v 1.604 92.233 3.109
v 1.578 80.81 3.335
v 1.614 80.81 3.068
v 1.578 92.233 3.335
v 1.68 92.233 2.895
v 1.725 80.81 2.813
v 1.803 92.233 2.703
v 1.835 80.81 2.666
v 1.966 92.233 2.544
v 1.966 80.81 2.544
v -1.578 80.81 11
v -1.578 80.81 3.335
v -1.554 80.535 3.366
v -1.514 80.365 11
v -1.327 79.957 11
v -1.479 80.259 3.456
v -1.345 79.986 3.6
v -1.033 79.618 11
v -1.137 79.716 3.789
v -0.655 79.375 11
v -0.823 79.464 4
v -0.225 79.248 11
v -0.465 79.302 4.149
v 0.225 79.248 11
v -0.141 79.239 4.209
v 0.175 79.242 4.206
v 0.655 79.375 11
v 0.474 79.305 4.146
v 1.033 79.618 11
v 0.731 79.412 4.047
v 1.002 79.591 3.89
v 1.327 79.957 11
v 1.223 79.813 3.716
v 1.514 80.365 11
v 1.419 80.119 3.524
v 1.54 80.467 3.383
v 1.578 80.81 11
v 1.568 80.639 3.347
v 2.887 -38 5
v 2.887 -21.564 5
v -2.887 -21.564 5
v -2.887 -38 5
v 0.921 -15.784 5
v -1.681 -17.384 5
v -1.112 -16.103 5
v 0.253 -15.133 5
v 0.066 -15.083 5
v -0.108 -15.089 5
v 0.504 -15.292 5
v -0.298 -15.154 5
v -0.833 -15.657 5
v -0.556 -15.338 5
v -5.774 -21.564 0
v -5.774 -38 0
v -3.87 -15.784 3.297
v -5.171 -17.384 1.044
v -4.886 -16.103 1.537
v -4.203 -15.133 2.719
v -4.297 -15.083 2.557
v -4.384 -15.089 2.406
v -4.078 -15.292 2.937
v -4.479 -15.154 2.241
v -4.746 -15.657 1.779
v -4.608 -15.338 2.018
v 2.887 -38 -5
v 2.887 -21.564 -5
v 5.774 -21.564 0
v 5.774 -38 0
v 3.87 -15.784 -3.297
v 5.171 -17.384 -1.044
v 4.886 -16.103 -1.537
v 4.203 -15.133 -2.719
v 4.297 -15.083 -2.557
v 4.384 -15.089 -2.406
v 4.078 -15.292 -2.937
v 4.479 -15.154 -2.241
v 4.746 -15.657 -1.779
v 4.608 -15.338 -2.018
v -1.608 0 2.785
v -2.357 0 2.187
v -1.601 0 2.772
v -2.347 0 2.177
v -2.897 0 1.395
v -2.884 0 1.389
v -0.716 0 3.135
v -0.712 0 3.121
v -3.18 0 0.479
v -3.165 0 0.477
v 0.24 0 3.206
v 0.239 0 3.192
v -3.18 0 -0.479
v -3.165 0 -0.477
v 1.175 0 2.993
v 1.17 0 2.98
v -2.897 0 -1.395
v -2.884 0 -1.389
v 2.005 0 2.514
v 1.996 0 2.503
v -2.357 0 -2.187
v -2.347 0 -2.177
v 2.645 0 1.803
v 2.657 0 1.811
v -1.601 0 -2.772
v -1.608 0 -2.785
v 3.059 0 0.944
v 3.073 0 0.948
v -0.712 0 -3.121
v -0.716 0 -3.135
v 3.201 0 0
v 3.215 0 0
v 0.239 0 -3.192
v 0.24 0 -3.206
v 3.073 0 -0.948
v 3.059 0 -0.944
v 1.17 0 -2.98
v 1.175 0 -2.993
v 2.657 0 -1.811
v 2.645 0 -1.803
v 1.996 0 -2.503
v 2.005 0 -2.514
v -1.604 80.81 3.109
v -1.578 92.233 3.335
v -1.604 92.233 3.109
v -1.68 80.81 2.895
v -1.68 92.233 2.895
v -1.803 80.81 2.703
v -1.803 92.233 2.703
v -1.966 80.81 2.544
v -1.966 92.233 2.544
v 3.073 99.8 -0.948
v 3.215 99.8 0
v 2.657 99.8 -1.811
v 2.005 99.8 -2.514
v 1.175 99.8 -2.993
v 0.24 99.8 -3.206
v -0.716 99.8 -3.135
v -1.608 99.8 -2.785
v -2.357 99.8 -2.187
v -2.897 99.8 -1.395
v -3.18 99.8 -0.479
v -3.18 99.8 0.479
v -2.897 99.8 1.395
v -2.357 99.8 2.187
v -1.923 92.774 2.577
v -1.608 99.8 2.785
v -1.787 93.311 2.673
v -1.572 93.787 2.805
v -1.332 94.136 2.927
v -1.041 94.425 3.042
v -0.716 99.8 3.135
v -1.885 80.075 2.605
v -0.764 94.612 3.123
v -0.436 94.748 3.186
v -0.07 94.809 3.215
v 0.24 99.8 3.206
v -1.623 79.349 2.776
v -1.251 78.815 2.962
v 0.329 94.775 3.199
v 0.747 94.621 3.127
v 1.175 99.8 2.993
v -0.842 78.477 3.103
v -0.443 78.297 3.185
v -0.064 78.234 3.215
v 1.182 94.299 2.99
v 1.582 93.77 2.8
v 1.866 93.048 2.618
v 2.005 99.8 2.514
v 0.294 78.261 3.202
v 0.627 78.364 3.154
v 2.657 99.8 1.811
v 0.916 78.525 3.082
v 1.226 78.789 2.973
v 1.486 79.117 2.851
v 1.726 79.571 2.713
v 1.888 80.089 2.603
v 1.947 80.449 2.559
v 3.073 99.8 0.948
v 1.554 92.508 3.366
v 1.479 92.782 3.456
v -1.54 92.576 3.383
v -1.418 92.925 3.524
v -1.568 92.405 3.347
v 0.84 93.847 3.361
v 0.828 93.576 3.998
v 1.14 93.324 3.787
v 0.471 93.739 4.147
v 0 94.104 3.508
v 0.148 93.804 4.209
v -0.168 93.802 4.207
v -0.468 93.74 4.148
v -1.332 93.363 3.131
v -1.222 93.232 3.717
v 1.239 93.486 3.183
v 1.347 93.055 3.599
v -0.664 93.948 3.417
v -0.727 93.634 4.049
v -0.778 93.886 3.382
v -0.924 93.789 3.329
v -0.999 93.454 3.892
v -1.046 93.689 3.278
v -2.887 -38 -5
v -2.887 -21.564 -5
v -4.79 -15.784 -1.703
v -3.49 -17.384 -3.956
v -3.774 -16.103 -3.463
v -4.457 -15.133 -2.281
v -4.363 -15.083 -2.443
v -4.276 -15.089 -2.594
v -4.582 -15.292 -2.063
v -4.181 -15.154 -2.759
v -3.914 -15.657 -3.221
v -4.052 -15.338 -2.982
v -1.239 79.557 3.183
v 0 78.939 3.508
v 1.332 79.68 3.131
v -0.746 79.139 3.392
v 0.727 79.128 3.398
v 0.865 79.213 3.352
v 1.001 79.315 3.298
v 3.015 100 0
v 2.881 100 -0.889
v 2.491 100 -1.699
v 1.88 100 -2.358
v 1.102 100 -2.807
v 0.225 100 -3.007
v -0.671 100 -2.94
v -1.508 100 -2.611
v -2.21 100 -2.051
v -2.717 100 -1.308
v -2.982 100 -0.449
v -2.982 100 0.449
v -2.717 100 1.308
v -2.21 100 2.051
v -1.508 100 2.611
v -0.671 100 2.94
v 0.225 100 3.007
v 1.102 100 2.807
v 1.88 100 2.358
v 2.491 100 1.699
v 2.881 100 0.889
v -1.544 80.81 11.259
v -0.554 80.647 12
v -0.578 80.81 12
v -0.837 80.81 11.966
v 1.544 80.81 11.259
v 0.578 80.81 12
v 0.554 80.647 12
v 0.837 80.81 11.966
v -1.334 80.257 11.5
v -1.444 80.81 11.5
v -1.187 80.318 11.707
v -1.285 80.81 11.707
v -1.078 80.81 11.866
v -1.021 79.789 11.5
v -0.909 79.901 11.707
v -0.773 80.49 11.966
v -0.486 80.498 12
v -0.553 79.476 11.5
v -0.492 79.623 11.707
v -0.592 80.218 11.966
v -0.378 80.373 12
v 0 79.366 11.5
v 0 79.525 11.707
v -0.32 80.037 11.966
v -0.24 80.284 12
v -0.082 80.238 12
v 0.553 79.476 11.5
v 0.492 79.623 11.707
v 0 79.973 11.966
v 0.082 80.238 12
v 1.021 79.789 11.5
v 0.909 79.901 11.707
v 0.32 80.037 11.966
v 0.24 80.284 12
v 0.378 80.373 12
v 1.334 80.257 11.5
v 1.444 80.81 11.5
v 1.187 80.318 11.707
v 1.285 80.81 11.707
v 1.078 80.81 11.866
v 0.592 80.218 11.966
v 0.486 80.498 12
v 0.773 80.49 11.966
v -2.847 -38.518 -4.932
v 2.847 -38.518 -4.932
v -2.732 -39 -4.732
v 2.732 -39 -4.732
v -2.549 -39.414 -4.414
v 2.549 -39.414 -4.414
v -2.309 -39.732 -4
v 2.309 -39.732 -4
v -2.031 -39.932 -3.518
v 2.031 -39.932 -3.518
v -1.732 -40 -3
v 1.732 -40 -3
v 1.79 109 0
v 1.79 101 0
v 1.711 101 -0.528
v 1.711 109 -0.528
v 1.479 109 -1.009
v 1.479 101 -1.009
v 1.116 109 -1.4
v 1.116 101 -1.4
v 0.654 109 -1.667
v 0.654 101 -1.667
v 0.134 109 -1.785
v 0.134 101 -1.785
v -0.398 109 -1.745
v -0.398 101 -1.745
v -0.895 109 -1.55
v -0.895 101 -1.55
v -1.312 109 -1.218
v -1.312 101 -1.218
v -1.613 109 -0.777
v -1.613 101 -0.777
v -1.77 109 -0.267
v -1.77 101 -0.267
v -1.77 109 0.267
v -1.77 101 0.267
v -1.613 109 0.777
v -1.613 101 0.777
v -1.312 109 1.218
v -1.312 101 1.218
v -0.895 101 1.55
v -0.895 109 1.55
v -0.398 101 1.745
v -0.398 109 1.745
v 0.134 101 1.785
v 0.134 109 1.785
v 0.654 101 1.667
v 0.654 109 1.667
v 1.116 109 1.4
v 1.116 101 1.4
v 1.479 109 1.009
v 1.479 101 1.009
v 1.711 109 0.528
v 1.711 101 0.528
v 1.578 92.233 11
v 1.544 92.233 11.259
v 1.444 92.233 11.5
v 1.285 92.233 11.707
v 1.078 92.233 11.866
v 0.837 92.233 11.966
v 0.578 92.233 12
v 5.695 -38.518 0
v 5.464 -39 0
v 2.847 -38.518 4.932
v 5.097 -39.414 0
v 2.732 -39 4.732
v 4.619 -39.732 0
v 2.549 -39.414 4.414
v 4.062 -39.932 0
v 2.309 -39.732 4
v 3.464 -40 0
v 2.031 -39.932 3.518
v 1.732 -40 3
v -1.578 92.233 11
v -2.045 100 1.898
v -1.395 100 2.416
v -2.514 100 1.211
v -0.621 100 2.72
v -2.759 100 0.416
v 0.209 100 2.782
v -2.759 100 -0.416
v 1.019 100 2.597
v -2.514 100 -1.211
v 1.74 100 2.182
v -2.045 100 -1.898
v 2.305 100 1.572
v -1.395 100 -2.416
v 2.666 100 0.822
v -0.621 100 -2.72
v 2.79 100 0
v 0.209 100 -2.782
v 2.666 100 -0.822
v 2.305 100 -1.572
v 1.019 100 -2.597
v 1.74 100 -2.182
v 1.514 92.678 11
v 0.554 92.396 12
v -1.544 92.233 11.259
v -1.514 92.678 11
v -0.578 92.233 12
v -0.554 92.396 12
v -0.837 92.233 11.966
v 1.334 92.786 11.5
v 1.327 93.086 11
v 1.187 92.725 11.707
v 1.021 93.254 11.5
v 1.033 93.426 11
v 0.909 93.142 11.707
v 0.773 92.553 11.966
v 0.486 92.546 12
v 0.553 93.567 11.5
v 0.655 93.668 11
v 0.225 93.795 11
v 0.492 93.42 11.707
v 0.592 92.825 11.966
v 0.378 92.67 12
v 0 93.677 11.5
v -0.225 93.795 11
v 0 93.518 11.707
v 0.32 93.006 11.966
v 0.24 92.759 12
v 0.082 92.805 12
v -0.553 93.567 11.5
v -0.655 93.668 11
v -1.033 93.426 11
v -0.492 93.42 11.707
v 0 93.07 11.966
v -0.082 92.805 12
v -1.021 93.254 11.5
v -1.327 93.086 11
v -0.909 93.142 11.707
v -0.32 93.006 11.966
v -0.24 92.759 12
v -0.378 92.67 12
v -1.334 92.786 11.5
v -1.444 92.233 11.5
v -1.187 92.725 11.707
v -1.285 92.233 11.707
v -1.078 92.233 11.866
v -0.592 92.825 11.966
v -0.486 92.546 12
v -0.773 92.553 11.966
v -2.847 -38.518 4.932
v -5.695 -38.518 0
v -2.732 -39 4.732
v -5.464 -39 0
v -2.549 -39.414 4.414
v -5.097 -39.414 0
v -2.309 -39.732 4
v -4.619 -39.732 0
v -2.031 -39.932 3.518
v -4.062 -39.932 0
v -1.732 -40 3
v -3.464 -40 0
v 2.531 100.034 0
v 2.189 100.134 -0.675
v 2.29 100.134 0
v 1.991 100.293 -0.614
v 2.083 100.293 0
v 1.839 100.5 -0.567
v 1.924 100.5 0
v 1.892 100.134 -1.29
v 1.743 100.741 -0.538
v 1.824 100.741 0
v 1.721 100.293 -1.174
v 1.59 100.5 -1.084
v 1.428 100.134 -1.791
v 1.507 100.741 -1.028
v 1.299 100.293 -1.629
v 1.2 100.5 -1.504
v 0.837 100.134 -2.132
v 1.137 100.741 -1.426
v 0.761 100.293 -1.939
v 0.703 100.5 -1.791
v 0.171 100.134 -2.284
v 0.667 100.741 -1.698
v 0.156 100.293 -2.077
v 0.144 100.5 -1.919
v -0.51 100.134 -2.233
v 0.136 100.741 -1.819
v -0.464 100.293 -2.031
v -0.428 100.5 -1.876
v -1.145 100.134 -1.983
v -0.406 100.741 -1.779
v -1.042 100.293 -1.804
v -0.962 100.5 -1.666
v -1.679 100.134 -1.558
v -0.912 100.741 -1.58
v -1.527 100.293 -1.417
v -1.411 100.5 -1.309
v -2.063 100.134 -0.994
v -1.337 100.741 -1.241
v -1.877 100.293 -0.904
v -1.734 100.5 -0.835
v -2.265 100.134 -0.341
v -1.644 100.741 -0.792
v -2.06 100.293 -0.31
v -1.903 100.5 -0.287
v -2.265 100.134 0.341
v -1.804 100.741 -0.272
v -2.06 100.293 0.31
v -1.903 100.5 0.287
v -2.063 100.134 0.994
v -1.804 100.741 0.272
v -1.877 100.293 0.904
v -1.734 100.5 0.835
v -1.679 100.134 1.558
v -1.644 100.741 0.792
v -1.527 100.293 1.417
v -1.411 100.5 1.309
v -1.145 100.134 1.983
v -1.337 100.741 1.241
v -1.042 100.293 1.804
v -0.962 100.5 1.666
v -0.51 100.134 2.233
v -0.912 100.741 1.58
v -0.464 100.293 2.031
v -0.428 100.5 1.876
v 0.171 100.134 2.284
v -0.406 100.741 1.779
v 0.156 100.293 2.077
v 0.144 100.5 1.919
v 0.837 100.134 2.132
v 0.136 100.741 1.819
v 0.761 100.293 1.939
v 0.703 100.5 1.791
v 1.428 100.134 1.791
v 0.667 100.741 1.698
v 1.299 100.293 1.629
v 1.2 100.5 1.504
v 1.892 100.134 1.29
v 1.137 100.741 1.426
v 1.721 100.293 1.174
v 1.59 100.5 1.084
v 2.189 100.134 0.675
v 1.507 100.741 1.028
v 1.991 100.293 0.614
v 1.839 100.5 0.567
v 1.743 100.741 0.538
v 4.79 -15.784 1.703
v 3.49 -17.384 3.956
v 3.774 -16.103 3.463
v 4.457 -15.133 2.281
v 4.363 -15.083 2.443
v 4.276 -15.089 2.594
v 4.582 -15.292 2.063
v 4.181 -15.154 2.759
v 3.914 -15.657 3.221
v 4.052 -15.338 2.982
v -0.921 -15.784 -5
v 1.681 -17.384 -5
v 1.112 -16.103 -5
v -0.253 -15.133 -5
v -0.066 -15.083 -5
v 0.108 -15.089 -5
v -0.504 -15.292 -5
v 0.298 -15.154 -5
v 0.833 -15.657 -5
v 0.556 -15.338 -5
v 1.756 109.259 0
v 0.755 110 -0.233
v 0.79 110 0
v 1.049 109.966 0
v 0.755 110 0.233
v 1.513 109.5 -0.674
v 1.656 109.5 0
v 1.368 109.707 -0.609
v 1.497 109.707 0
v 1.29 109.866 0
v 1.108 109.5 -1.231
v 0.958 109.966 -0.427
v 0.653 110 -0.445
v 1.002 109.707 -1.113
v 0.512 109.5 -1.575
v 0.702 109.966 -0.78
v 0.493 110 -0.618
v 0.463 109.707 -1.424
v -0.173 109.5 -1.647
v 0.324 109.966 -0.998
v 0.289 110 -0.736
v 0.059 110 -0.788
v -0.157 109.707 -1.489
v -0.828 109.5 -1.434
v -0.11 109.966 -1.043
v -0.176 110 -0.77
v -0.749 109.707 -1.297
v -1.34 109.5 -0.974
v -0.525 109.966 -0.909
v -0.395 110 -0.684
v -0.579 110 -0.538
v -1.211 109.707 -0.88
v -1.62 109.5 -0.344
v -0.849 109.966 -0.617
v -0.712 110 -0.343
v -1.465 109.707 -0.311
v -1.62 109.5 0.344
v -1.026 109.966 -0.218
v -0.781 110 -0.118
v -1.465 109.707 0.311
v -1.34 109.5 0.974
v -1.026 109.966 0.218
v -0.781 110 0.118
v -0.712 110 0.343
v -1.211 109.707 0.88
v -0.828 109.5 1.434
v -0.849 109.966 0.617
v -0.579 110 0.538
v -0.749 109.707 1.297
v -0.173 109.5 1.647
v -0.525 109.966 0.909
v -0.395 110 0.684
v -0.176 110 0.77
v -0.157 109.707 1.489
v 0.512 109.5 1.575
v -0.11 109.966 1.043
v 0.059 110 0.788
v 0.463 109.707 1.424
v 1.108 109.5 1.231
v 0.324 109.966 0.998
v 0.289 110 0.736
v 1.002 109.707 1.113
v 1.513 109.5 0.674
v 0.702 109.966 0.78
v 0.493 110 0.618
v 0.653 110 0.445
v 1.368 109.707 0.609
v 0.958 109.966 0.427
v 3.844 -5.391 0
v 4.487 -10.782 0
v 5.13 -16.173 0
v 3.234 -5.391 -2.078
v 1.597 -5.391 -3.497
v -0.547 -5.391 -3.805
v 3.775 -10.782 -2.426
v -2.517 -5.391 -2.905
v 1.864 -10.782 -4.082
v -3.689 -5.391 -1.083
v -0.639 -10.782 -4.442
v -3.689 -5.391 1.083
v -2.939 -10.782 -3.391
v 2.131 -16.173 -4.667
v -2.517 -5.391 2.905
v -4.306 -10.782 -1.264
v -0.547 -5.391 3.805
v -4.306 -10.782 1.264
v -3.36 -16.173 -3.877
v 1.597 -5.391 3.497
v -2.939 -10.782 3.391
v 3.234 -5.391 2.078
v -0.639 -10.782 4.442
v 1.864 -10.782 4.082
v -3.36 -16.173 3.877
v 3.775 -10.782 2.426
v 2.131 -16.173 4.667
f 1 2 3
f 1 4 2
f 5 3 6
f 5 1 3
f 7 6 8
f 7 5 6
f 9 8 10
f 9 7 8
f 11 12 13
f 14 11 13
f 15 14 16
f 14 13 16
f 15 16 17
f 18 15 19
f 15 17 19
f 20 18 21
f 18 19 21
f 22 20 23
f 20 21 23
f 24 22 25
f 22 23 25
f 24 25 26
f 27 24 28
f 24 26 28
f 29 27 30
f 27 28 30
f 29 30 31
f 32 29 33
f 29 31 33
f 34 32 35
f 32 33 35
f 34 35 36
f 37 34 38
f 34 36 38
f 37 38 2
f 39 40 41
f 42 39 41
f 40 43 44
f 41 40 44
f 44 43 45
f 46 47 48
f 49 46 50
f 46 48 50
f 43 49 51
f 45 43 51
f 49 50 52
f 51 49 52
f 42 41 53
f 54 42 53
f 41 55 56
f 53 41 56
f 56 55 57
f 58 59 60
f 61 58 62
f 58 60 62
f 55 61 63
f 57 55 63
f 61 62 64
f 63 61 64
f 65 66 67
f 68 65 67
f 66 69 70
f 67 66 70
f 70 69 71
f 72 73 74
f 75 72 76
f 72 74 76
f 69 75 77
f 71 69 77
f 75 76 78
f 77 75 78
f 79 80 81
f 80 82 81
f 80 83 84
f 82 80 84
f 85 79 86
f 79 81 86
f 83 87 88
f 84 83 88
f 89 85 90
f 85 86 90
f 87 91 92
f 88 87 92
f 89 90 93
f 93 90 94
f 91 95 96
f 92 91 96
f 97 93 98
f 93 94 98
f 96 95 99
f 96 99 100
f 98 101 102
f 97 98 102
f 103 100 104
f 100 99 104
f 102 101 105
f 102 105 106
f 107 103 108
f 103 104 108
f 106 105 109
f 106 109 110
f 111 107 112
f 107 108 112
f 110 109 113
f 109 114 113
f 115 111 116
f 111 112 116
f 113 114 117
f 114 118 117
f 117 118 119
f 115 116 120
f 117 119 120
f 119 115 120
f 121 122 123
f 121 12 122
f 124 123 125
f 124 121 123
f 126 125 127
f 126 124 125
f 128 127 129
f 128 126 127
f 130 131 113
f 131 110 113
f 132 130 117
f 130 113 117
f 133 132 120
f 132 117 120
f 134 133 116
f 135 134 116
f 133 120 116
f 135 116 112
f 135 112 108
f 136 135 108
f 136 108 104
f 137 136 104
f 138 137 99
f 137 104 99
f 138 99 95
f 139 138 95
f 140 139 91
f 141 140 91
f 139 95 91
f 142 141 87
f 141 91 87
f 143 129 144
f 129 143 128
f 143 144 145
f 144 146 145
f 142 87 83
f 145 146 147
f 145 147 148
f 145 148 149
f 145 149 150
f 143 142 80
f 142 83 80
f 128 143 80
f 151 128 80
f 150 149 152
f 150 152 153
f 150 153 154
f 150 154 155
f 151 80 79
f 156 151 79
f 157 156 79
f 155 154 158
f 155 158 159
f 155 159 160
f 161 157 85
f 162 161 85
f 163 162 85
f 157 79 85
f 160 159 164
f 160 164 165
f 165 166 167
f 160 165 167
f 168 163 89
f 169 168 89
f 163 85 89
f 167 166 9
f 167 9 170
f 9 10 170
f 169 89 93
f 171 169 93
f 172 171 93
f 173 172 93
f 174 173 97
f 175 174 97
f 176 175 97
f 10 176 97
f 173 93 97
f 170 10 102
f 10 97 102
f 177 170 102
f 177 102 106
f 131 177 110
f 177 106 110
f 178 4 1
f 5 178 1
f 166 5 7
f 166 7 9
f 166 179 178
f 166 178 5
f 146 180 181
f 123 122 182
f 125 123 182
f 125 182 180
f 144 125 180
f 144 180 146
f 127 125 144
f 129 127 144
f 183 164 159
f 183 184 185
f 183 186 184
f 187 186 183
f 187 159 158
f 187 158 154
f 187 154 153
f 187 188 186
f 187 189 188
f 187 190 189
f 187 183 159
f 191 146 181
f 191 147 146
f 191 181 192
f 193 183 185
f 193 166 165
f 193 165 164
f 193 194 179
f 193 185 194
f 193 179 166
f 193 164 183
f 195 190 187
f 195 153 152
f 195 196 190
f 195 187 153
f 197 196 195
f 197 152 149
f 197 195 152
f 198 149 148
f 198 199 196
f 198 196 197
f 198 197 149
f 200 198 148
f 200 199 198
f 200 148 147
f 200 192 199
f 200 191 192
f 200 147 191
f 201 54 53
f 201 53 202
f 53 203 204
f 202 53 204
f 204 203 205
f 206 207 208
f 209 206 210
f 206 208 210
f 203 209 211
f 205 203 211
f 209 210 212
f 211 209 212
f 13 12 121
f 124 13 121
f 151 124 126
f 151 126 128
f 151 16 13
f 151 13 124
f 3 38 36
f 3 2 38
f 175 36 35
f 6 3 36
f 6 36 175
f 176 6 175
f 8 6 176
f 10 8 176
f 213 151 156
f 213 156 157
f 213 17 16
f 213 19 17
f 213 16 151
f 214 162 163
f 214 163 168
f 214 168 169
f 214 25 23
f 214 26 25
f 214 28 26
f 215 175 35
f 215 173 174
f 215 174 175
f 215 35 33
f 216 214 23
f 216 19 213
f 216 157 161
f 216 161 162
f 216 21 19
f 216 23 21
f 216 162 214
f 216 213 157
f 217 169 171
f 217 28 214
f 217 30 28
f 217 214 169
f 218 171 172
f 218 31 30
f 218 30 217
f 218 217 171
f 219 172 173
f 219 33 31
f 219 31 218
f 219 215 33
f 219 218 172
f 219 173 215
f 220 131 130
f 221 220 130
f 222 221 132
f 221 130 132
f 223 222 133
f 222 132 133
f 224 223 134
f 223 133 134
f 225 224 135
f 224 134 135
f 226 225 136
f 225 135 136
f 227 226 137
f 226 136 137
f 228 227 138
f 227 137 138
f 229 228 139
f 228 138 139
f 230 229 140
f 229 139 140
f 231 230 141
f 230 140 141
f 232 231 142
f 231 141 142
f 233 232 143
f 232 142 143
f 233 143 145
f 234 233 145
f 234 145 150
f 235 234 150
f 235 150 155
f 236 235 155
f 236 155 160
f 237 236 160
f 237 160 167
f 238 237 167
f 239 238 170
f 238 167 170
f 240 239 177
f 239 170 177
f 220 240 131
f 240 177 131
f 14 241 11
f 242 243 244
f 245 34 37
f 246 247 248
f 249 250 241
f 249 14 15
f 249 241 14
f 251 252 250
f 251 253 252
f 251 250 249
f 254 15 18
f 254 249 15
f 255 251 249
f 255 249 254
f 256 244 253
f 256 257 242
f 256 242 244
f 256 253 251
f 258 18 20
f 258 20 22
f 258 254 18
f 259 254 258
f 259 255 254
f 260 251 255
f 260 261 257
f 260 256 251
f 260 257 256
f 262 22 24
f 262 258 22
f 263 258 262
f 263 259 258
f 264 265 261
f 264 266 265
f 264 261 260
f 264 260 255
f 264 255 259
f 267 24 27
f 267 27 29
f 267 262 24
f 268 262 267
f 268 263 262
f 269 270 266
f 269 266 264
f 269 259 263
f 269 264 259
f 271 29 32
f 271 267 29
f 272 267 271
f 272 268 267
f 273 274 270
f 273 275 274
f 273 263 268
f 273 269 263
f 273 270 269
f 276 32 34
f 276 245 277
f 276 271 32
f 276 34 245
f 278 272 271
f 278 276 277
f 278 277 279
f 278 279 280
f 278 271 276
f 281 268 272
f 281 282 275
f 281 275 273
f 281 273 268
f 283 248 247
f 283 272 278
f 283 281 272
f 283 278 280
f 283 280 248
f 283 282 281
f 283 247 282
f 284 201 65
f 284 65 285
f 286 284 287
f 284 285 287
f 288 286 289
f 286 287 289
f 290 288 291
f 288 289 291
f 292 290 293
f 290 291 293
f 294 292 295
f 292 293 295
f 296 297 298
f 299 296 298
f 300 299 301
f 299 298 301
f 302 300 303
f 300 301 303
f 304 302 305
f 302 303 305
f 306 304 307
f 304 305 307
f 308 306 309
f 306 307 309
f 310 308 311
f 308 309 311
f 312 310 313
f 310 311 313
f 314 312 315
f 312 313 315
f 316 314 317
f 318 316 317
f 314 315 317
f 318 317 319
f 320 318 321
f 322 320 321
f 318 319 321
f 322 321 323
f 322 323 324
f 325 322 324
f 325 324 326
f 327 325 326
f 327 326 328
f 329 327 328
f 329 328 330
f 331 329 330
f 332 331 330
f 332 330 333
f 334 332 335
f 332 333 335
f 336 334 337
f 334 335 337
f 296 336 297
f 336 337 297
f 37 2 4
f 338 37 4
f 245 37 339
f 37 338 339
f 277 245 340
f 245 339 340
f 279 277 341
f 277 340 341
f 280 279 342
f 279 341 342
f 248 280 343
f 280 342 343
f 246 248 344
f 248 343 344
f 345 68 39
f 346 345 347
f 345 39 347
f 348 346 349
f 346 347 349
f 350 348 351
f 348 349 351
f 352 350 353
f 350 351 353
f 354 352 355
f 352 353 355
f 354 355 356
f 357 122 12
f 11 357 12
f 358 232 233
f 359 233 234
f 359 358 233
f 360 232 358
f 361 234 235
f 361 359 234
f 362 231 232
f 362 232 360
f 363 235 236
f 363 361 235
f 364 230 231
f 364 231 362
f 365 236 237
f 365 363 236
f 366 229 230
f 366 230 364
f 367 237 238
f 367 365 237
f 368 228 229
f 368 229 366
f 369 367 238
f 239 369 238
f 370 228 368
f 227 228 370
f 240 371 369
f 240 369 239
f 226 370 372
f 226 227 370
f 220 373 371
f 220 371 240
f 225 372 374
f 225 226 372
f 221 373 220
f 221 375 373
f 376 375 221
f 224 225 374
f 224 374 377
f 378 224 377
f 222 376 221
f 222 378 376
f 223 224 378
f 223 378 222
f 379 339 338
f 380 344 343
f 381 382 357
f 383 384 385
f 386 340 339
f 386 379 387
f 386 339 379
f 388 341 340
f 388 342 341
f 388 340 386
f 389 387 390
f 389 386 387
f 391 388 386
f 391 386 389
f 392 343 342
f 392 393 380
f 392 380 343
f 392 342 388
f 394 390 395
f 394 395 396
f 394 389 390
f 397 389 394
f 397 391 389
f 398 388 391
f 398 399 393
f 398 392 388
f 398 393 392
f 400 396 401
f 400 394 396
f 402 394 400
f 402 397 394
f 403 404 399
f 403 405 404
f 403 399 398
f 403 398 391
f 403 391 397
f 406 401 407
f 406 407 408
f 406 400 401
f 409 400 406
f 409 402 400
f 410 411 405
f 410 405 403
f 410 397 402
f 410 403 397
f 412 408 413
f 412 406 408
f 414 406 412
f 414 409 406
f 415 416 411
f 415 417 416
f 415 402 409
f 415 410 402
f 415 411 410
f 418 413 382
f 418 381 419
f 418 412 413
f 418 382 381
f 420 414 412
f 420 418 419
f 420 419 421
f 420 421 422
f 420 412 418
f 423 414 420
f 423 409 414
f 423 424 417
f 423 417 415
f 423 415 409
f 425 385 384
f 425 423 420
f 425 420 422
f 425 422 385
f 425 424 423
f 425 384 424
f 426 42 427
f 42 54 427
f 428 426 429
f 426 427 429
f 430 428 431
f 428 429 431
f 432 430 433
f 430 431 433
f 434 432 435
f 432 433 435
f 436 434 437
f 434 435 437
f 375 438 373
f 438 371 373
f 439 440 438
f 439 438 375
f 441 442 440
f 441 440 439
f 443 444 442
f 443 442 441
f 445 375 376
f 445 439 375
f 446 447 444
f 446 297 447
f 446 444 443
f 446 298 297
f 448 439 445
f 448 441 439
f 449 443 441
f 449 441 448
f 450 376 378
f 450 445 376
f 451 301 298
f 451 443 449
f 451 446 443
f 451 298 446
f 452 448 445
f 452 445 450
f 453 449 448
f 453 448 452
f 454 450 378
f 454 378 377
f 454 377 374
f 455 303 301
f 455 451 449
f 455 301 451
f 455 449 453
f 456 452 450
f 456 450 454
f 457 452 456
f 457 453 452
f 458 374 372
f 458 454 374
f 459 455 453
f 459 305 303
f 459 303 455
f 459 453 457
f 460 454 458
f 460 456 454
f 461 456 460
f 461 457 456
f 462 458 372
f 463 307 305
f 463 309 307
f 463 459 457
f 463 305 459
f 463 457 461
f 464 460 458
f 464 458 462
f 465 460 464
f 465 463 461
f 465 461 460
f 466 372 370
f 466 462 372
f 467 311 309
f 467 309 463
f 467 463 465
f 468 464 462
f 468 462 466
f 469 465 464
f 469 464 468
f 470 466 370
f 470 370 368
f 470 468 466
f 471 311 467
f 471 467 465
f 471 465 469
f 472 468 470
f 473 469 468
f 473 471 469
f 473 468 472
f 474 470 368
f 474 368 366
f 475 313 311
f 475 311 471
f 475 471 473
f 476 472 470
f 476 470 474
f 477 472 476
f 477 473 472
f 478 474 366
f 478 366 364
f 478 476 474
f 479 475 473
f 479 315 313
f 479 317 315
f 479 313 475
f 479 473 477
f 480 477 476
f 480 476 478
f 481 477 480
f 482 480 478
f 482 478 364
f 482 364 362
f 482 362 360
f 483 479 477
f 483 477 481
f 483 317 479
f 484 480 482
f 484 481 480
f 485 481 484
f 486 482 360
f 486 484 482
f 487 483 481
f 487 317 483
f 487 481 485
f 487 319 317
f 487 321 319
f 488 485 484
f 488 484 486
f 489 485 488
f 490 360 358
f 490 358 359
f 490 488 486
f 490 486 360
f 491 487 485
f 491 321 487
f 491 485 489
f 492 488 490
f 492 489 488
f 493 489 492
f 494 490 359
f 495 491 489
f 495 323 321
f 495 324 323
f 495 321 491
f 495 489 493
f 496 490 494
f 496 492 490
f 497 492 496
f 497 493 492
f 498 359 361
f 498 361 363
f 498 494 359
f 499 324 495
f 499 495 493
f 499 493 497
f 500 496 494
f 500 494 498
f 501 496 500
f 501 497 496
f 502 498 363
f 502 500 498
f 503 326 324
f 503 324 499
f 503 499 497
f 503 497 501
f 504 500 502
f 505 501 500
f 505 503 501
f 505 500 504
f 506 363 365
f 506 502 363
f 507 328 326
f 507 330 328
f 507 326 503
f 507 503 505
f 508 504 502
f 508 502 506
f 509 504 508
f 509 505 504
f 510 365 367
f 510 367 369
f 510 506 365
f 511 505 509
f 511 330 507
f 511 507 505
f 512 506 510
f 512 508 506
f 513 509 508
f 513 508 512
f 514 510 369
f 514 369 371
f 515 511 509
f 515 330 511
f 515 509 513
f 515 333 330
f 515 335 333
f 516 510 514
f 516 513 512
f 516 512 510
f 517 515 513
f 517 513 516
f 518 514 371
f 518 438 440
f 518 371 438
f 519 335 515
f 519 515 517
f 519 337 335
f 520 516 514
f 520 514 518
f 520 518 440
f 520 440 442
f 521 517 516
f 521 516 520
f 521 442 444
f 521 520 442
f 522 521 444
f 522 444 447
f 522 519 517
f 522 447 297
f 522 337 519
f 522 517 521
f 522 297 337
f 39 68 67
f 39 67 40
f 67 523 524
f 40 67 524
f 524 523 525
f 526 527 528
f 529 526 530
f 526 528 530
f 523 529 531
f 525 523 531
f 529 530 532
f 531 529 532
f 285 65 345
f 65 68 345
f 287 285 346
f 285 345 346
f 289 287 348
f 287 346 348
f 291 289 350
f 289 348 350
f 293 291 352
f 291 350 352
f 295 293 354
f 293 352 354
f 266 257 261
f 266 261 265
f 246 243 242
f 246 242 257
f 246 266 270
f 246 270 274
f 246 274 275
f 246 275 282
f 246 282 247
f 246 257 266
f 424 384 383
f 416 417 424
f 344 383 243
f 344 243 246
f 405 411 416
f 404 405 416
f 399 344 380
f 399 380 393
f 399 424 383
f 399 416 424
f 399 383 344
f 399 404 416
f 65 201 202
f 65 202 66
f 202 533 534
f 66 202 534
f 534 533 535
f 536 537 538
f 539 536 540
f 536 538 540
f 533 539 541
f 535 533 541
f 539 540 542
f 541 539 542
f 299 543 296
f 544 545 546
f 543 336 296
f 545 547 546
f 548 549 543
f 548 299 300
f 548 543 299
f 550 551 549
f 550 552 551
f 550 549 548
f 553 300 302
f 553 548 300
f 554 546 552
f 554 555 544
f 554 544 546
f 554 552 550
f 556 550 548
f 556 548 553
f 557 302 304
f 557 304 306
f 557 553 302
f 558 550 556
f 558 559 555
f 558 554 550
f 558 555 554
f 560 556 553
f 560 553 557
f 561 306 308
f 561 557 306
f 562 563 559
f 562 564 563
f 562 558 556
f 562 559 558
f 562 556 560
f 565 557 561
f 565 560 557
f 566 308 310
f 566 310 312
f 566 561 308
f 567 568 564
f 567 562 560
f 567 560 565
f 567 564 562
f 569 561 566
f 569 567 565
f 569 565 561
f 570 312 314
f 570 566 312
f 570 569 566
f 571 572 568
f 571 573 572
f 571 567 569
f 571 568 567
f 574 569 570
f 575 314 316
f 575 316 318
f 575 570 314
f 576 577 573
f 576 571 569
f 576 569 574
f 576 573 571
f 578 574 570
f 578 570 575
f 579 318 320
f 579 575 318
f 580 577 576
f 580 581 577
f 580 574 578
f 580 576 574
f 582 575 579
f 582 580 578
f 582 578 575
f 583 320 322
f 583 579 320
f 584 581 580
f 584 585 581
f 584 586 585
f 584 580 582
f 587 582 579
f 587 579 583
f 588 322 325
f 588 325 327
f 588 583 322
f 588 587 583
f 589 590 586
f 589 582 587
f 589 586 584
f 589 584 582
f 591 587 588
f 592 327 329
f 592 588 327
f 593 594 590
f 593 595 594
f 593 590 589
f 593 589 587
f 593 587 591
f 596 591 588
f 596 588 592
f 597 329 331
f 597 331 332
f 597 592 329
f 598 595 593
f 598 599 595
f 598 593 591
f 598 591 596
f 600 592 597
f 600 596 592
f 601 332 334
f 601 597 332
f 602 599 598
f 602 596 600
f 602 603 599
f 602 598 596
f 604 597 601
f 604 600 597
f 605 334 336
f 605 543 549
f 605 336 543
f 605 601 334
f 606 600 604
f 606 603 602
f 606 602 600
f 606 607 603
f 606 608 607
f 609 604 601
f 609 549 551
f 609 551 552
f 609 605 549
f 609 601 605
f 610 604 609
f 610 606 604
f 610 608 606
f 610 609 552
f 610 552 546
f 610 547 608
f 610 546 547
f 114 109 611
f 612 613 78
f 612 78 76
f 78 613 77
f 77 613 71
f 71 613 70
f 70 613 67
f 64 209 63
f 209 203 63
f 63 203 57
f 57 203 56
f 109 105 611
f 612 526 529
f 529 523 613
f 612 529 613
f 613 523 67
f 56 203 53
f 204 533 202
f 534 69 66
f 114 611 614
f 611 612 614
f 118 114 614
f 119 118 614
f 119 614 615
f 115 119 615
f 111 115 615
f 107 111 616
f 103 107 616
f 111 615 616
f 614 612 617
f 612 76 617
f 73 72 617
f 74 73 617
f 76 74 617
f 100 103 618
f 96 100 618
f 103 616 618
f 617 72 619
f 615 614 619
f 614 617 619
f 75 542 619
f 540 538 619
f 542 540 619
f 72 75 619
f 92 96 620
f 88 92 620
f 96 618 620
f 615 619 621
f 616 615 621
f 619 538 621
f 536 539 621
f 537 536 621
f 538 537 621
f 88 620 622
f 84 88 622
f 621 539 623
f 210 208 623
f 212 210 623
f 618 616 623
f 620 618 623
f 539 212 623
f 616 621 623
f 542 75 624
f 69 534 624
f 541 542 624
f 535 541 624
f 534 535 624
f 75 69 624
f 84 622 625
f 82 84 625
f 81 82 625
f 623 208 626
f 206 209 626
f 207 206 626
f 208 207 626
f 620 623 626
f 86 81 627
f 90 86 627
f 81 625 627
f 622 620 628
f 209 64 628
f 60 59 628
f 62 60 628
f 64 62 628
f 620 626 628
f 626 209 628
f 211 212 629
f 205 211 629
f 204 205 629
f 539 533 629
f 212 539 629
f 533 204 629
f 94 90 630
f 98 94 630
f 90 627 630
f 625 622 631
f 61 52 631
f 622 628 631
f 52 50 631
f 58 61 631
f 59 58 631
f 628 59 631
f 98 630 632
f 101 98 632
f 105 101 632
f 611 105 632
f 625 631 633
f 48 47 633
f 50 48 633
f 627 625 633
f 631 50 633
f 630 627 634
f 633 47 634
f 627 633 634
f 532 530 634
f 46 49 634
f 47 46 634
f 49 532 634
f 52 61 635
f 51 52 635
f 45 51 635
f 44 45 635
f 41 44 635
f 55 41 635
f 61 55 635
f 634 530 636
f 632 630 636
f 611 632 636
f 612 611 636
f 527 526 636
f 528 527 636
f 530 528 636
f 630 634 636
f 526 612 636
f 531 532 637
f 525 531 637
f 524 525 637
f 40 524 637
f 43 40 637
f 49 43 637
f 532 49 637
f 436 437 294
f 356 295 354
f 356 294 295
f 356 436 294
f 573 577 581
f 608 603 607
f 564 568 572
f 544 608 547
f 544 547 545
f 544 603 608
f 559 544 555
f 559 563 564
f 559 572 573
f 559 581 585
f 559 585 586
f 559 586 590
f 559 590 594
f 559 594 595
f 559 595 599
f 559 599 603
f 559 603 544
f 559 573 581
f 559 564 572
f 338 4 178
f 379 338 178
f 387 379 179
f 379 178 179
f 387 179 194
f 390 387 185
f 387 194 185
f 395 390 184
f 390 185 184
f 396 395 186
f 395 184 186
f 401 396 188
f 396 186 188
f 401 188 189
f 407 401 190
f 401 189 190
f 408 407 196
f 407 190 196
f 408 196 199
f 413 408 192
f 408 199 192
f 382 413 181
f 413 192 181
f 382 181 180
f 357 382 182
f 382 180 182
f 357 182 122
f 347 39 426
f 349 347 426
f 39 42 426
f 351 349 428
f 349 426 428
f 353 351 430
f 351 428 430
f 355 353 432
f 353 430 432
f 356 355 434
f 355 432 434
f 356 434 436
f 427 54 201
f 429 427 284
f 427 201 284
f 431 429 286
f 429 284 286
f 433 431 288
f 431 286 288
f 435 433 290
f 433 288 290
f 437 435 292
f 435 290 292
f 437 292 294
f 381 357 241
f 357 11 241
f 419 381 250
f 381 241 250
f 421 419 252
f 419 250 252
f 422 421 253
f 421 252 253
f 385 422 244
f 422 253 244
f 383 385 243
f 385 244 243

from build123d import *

# Parameters (mm, degrees)
PAD_DEPTH    = 40
SKETCH001_R  = 3.215442
PAD001_DEPTH = 100
SKETCH002_R  = 1.790301
PAD002_DEPTH = 10
FILLET_R     = 1
FILLET001_R  = 1
CHAMFER_SIZE = 0.2
FILLET002_R  = 2
PAD003_DEPTH = 10
FILLET003_R  = 1
FILLET004_R  = 1


with BuildPart() as part:
    # Sketch → Pad (new body)
    with BuildSketch(Plane.XZ):
        Polygon((2.886751, -5), (5.773503, 0), (2.886751, 5), (-2.886751, 5), (-5.773503, 0), (-2.886751, -5), align=None)
    extrude(amount=PAD_DEPTH)

    # Sketch001 (on Face7 of Pad) → Pad001 (join)
    with BuildSketch(Plane(origin=(0, 0, 0), x_dir=(1, 0, 0), z_dir=(0, 1, 0))):
        Circle(SKETCH001_R)
    extrude(amount=PAD001_DEPTH)

    # Sketch002 (on Face10 of Pad001) → Pad002 (join)
    with BuildSketch(Plane(origin=(0, 100, 0), x_dir=(1, 0, 0), z_dir=(0, 1, 0))):
        Circle(SKETCH002_R)
    extrude(amount=PAD002_DEPTH)

    # Fillet
    fillet_edges = [part.edges().sort_by_distance(p)[0] for p in [
        (-1.790301, 100, 0),
    ]]
    fillet(fillet_edges, radius=FILLET_R)

    # Fillet001
    fillet001_edges = [part.edges().sort_by_distance(p)[0] for p in [
        (-1.790301, 110, 0),
    ]]
    fillet(fillet001_edges, radius=FILLET001_R)

    # Chamfer
    chamfer_edges = [part.edges().sort_by_distance(p)[0] for p in [
        (-3.215442, 100, 0),
    ]]
    chamfer(chamfer_edges, length=CHAMFER_SIZE)

    # Sketch003 → Groove (revolve, cut)
    with BuildSketch(Plane.XY):
        Polygon((3.201163, 0), (6.726055, -29.548664), (6.726055, 0), align=None)
    revolve(axis=Axis((0, 0, 0), (0, 1, 0)), mode=Mode.SUBTRACT)

    # Fillet002
    fillet002_edges = [part.edges().sort_by_distance(p)[0] for p in [
        (4.330127, -40, -2.5),
        (4.330127, -40, 2.5),
        (0, -40, 5),
        (-4.330127, -40, 2.5),
        (-4.330127, -40, -2.5),
        (0, -40, -5),
    ]]
    fillet(fillet002_edges, radius=FILLET002_R)

    # Sketch004 → Pad003 (join)
    with BuildSketch(Plane.XY.offset(2)):
        with BuildLine():
            ThreePointArc((1.577738, 92.233203), (0, 93.810941), (-1.577738, 92.233203))
            Line((-1.577738, 92.233203), (-1.577738, 80.809975))
            ThreePointArc((-1.577738, 80.809975), (0, 79.232237), (1.577738, 80.809975))
            Line((1.577738, 80.809975), (1.577738, 92.233203))
        make_face()
    extrude(amount=PAD003_DEPTH)

    # Fillet003
    fillet003_edges = [part.edges().sort_by_distance(p)[0] for p in [
        (0, 93.810941, 12),
        (-1.577738, 86.521589, 12),
        (0, 79.232237, 12),
        (1.577738, 86.521589, 12),
    ]]
    fillet(fillet003_edges, radius=FILLET003_R)

    # Fillet004
    fillet004_edges = [part.edges().sort_by_distance(p)[0] for p in [
        (-1.577738, 86.521589, 2.801751),
        (0, 79.232237, 3.215442),
        (0, 93.810941, 3.215442),
        (1.577738, 86.521589, 2.801751),
    ]]
    fillet(fillet004_edges, radius=FILLET004_R)


solid = part.part
